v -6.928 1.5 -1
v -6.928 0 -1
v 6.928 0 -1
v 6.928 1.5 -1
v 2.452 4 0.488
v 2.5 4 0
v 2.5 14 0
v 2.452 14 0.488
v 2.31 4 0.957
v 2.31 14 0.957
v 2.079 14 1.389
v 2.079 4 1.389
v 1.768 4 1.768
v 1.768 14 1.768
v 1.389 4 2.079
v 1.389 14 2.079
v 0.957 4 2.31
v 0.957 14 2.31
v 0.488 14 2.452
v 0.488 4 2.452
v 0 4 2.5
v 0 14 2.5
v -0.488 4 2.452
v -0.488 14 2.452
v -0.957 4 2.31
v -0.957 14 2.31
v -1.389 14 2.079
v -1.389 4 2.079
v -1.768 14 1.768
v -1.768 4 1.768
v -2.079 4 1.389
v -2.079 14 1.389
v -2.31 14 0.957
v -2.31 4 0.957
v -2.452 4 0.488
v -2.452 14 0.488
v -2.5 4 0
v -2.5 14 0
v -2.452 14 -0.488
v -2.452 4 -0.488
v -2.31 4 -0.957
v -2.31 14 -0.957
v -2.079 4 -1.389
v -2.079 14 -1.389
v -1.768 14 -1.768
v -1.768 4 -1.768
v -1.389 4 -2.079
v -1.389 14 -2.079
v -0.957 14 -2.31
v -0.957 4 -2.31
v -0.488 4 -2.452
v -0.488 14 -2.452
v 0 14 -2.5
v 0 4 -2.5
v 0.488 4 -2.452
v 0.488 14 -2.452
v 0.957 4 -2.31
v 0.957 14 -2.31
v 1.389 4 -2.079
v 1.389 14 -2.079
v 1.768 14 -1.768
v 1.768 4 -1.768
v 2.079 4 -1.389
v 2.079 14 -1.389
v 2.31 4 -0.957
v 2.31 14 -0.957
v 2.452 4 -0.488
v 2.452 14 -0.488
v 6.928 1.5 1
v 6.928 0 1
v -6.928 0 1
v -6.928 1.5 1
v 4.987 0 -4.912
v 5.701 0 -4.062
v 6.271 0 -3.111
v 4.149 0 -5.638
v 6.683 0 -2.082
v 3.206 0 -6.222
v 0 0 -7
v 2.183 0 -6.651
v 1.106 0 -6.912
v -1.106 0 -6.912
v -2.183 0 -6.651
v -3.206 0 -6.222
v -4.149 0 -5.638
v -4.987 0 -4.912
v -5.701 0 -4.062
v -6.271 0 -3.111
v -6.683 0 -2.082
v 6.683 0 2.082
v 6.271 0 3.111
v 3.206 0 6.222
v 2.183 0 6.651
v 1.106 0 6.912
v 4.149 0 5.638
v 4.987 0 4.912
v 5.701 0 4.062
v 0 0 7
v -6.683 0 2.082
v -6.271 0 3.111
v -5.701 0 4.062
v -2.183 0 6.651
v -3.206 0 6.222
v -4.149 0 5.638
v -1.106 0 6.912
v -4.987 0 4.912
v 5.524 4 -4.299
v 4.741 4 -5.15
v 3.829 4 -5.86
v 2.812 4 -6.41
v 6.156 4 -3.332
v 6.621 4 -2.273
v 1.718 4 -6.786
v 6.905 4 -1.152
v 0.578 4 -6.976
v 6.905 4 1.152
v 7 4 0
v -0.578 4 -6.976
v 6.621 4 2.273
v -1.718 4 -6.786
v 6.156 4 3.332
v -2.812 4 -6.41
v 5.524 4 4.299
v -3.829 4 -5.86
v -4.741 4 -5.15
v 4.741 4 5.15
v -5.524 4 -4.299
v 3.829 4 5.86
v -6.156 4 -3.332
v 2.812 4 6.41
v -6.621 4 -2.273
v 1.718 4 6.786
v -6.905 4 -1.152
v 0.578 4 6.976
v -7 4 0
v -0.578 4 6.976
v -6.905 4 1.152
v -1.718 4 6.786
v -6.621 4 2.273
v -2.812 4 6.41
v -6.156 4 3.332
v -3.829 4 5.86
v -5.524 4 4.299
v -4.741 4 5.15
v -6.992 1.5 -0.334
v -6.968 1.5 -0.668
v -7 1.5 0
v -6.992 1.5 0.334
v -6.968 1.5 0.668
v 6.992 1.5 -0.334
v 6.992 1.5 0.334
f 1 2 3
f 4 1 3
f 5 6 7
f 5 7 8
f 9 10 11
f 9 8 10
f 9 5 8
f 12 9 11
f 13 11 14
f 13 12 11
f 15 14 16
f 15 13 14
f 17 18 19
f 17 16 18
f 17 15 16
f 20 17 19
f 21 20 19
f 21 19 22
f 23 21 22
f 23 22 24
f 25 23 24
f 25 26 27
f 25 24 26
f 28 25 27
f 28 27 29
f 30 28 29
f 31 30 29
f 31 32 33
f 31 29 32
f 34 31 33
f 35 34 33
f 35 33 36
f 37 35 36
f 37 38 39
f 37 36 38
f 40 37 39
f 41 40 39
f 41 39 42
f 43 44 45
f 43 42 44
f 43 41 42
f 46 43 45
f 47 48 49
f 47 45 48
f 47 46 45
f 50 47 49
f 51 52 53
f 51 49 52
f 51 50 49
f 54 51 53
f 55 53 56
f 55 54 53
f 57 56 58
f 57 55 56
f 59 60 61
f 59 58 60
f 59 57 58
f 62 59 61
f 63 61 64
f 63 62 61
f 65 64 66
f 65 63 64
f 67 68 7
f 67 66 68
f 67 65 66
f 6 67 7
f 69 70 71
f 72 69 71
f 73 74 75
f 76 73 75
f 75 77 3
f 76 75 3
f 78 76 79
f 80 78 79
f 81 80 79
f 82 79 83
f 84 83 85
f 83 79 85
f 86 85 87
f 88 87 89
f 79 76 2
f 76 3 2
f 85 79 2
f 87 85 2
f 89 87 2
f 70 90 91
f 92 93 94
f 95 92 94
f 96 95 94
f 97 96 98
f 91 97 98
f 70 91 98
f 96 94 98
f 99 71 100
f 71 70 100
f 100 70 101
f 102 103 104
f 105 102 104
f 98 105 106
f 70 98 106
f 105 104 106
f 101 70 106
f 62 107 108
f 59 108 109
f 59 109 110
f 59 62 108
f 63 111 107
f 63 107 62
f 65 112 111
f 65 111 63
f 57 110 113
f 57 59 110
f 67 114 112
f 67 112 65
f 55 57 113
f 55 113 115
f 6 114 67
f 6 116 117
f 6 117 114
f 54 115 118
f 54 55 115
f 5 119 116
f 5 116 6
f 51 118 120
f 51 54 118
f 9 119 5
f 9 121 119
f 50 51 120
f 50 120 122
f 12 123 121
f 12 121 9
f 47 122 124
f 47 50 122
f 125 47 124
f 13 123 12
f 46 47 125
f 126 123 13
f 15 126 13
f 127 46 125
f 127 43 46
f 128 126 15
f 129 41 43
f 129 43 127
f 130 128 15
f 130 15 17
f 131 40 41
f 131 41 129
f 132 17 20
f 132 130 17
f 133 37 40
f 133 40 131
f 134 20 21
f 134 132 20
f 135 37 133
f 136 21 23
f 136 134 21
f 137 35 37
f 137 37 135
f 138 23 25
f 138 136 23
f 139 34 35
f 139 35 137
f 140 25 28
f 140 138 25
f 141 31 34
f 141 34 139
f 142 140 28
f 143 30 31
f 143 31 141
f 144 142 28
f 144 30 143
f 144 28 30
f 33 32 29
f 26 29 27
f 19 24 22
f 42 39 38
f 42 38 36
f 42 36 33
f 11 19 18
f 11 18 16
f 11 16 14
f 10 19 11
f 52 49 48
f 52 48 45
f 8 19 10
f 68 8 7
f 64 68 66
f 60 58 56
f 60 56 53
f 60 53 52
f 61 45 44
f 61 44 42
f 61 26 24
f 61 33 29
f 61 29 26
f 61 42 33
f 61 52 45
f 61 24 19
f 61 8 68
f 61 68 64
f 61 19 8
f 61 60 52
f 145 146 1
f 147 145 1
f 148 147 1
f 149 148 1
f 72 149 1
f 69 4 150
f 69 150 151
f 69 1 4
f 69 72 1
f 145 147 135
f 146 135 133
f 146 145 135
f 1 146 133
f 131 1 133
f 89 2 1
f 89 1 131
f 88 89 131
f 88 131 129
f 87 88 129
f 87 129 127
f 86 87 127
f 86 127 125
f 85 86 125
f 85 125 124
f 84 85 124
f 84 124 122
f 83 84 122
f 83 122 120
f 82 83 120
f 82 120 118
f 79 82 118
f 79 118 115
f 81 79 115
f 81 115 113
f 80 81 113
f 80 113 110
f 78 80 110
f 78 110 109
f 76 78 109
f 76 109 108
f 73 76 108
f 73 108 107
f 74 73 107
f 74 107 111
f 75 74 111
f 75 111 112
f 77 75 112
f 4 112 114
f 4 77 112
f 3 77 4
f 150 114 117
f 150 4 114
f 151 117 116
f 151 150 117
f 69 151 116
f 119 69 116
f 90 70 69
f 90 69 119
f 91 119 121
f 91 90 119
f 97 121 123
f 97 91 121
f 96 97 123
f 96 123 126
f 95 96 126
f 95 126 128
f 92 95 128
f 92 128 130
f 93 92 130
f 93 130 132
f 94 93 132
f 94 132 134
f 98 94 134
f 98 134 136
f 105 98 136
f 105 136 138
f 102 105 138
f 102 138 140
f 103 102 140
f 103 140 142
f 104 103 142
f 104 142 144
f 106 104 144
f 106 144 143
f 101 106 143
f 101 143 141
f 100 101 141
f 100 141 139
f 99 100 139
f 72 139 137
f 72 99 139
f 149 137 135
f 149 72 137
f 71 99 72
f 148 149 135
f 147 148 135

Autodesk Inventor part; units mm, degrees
ref_plane "YZ Plane" through (0, 0, 0) normal (1, 0, 0) x (0, 1, 0)
ref_plane "XZ Plane" through (0, 0, 0) normal (0, 1, 0) x (-1, 0, 0)
ref_plane "XY Plane" through (0, 0, 0) normal (0, 0, 1) x (1, 0, 0)
sketch "スケッチ1" plane through (0, 0, 0) normal (0, 1, 0) x (-1, 0, 0)
  circle A0 centre (0, 0) radius 7
  dimension "d0" = 14
extrude "押し出し1" add sketch "スケッチ1" along normal blind 4
sketch "スケッチ2" plane through (0, 4, 0) normal (0, 1, 0) x (1, 0, 0)
  circle A0 centre (0, 0) radius 2.5
  dimension "d3" = 5
extrude "押し出し2" add sketch "スケッチ2" along normal blind 10
thread "ねじ1" size "M6x1" class "6g" standard "ANSI Metric M Profile" length 10 offset 4
sketch "スケッチ3" plane through (0, 0, 0) normal (0, -1, 0) x (1, 0, 0)
  line L0 (10, 1) -> (-10, 1)
  line L1 (-10, 1) -> (-10, -1)
  line L2 (-10, -1) -> (10, -1)
  line L3 (10, -1) -> (10, 1)
  point P0 (0, 0)
  point P1 (0, 1)
  dimension "d8" = 20
  dimension "d9" = 2
  dimension "d10" = 1
  dimension "d11" = 10
extrude "押し出し3" cut sketch "スケッチ3" against normal blind 1.5
properties part number "camera_mount" material "アルミニウム 6061"
